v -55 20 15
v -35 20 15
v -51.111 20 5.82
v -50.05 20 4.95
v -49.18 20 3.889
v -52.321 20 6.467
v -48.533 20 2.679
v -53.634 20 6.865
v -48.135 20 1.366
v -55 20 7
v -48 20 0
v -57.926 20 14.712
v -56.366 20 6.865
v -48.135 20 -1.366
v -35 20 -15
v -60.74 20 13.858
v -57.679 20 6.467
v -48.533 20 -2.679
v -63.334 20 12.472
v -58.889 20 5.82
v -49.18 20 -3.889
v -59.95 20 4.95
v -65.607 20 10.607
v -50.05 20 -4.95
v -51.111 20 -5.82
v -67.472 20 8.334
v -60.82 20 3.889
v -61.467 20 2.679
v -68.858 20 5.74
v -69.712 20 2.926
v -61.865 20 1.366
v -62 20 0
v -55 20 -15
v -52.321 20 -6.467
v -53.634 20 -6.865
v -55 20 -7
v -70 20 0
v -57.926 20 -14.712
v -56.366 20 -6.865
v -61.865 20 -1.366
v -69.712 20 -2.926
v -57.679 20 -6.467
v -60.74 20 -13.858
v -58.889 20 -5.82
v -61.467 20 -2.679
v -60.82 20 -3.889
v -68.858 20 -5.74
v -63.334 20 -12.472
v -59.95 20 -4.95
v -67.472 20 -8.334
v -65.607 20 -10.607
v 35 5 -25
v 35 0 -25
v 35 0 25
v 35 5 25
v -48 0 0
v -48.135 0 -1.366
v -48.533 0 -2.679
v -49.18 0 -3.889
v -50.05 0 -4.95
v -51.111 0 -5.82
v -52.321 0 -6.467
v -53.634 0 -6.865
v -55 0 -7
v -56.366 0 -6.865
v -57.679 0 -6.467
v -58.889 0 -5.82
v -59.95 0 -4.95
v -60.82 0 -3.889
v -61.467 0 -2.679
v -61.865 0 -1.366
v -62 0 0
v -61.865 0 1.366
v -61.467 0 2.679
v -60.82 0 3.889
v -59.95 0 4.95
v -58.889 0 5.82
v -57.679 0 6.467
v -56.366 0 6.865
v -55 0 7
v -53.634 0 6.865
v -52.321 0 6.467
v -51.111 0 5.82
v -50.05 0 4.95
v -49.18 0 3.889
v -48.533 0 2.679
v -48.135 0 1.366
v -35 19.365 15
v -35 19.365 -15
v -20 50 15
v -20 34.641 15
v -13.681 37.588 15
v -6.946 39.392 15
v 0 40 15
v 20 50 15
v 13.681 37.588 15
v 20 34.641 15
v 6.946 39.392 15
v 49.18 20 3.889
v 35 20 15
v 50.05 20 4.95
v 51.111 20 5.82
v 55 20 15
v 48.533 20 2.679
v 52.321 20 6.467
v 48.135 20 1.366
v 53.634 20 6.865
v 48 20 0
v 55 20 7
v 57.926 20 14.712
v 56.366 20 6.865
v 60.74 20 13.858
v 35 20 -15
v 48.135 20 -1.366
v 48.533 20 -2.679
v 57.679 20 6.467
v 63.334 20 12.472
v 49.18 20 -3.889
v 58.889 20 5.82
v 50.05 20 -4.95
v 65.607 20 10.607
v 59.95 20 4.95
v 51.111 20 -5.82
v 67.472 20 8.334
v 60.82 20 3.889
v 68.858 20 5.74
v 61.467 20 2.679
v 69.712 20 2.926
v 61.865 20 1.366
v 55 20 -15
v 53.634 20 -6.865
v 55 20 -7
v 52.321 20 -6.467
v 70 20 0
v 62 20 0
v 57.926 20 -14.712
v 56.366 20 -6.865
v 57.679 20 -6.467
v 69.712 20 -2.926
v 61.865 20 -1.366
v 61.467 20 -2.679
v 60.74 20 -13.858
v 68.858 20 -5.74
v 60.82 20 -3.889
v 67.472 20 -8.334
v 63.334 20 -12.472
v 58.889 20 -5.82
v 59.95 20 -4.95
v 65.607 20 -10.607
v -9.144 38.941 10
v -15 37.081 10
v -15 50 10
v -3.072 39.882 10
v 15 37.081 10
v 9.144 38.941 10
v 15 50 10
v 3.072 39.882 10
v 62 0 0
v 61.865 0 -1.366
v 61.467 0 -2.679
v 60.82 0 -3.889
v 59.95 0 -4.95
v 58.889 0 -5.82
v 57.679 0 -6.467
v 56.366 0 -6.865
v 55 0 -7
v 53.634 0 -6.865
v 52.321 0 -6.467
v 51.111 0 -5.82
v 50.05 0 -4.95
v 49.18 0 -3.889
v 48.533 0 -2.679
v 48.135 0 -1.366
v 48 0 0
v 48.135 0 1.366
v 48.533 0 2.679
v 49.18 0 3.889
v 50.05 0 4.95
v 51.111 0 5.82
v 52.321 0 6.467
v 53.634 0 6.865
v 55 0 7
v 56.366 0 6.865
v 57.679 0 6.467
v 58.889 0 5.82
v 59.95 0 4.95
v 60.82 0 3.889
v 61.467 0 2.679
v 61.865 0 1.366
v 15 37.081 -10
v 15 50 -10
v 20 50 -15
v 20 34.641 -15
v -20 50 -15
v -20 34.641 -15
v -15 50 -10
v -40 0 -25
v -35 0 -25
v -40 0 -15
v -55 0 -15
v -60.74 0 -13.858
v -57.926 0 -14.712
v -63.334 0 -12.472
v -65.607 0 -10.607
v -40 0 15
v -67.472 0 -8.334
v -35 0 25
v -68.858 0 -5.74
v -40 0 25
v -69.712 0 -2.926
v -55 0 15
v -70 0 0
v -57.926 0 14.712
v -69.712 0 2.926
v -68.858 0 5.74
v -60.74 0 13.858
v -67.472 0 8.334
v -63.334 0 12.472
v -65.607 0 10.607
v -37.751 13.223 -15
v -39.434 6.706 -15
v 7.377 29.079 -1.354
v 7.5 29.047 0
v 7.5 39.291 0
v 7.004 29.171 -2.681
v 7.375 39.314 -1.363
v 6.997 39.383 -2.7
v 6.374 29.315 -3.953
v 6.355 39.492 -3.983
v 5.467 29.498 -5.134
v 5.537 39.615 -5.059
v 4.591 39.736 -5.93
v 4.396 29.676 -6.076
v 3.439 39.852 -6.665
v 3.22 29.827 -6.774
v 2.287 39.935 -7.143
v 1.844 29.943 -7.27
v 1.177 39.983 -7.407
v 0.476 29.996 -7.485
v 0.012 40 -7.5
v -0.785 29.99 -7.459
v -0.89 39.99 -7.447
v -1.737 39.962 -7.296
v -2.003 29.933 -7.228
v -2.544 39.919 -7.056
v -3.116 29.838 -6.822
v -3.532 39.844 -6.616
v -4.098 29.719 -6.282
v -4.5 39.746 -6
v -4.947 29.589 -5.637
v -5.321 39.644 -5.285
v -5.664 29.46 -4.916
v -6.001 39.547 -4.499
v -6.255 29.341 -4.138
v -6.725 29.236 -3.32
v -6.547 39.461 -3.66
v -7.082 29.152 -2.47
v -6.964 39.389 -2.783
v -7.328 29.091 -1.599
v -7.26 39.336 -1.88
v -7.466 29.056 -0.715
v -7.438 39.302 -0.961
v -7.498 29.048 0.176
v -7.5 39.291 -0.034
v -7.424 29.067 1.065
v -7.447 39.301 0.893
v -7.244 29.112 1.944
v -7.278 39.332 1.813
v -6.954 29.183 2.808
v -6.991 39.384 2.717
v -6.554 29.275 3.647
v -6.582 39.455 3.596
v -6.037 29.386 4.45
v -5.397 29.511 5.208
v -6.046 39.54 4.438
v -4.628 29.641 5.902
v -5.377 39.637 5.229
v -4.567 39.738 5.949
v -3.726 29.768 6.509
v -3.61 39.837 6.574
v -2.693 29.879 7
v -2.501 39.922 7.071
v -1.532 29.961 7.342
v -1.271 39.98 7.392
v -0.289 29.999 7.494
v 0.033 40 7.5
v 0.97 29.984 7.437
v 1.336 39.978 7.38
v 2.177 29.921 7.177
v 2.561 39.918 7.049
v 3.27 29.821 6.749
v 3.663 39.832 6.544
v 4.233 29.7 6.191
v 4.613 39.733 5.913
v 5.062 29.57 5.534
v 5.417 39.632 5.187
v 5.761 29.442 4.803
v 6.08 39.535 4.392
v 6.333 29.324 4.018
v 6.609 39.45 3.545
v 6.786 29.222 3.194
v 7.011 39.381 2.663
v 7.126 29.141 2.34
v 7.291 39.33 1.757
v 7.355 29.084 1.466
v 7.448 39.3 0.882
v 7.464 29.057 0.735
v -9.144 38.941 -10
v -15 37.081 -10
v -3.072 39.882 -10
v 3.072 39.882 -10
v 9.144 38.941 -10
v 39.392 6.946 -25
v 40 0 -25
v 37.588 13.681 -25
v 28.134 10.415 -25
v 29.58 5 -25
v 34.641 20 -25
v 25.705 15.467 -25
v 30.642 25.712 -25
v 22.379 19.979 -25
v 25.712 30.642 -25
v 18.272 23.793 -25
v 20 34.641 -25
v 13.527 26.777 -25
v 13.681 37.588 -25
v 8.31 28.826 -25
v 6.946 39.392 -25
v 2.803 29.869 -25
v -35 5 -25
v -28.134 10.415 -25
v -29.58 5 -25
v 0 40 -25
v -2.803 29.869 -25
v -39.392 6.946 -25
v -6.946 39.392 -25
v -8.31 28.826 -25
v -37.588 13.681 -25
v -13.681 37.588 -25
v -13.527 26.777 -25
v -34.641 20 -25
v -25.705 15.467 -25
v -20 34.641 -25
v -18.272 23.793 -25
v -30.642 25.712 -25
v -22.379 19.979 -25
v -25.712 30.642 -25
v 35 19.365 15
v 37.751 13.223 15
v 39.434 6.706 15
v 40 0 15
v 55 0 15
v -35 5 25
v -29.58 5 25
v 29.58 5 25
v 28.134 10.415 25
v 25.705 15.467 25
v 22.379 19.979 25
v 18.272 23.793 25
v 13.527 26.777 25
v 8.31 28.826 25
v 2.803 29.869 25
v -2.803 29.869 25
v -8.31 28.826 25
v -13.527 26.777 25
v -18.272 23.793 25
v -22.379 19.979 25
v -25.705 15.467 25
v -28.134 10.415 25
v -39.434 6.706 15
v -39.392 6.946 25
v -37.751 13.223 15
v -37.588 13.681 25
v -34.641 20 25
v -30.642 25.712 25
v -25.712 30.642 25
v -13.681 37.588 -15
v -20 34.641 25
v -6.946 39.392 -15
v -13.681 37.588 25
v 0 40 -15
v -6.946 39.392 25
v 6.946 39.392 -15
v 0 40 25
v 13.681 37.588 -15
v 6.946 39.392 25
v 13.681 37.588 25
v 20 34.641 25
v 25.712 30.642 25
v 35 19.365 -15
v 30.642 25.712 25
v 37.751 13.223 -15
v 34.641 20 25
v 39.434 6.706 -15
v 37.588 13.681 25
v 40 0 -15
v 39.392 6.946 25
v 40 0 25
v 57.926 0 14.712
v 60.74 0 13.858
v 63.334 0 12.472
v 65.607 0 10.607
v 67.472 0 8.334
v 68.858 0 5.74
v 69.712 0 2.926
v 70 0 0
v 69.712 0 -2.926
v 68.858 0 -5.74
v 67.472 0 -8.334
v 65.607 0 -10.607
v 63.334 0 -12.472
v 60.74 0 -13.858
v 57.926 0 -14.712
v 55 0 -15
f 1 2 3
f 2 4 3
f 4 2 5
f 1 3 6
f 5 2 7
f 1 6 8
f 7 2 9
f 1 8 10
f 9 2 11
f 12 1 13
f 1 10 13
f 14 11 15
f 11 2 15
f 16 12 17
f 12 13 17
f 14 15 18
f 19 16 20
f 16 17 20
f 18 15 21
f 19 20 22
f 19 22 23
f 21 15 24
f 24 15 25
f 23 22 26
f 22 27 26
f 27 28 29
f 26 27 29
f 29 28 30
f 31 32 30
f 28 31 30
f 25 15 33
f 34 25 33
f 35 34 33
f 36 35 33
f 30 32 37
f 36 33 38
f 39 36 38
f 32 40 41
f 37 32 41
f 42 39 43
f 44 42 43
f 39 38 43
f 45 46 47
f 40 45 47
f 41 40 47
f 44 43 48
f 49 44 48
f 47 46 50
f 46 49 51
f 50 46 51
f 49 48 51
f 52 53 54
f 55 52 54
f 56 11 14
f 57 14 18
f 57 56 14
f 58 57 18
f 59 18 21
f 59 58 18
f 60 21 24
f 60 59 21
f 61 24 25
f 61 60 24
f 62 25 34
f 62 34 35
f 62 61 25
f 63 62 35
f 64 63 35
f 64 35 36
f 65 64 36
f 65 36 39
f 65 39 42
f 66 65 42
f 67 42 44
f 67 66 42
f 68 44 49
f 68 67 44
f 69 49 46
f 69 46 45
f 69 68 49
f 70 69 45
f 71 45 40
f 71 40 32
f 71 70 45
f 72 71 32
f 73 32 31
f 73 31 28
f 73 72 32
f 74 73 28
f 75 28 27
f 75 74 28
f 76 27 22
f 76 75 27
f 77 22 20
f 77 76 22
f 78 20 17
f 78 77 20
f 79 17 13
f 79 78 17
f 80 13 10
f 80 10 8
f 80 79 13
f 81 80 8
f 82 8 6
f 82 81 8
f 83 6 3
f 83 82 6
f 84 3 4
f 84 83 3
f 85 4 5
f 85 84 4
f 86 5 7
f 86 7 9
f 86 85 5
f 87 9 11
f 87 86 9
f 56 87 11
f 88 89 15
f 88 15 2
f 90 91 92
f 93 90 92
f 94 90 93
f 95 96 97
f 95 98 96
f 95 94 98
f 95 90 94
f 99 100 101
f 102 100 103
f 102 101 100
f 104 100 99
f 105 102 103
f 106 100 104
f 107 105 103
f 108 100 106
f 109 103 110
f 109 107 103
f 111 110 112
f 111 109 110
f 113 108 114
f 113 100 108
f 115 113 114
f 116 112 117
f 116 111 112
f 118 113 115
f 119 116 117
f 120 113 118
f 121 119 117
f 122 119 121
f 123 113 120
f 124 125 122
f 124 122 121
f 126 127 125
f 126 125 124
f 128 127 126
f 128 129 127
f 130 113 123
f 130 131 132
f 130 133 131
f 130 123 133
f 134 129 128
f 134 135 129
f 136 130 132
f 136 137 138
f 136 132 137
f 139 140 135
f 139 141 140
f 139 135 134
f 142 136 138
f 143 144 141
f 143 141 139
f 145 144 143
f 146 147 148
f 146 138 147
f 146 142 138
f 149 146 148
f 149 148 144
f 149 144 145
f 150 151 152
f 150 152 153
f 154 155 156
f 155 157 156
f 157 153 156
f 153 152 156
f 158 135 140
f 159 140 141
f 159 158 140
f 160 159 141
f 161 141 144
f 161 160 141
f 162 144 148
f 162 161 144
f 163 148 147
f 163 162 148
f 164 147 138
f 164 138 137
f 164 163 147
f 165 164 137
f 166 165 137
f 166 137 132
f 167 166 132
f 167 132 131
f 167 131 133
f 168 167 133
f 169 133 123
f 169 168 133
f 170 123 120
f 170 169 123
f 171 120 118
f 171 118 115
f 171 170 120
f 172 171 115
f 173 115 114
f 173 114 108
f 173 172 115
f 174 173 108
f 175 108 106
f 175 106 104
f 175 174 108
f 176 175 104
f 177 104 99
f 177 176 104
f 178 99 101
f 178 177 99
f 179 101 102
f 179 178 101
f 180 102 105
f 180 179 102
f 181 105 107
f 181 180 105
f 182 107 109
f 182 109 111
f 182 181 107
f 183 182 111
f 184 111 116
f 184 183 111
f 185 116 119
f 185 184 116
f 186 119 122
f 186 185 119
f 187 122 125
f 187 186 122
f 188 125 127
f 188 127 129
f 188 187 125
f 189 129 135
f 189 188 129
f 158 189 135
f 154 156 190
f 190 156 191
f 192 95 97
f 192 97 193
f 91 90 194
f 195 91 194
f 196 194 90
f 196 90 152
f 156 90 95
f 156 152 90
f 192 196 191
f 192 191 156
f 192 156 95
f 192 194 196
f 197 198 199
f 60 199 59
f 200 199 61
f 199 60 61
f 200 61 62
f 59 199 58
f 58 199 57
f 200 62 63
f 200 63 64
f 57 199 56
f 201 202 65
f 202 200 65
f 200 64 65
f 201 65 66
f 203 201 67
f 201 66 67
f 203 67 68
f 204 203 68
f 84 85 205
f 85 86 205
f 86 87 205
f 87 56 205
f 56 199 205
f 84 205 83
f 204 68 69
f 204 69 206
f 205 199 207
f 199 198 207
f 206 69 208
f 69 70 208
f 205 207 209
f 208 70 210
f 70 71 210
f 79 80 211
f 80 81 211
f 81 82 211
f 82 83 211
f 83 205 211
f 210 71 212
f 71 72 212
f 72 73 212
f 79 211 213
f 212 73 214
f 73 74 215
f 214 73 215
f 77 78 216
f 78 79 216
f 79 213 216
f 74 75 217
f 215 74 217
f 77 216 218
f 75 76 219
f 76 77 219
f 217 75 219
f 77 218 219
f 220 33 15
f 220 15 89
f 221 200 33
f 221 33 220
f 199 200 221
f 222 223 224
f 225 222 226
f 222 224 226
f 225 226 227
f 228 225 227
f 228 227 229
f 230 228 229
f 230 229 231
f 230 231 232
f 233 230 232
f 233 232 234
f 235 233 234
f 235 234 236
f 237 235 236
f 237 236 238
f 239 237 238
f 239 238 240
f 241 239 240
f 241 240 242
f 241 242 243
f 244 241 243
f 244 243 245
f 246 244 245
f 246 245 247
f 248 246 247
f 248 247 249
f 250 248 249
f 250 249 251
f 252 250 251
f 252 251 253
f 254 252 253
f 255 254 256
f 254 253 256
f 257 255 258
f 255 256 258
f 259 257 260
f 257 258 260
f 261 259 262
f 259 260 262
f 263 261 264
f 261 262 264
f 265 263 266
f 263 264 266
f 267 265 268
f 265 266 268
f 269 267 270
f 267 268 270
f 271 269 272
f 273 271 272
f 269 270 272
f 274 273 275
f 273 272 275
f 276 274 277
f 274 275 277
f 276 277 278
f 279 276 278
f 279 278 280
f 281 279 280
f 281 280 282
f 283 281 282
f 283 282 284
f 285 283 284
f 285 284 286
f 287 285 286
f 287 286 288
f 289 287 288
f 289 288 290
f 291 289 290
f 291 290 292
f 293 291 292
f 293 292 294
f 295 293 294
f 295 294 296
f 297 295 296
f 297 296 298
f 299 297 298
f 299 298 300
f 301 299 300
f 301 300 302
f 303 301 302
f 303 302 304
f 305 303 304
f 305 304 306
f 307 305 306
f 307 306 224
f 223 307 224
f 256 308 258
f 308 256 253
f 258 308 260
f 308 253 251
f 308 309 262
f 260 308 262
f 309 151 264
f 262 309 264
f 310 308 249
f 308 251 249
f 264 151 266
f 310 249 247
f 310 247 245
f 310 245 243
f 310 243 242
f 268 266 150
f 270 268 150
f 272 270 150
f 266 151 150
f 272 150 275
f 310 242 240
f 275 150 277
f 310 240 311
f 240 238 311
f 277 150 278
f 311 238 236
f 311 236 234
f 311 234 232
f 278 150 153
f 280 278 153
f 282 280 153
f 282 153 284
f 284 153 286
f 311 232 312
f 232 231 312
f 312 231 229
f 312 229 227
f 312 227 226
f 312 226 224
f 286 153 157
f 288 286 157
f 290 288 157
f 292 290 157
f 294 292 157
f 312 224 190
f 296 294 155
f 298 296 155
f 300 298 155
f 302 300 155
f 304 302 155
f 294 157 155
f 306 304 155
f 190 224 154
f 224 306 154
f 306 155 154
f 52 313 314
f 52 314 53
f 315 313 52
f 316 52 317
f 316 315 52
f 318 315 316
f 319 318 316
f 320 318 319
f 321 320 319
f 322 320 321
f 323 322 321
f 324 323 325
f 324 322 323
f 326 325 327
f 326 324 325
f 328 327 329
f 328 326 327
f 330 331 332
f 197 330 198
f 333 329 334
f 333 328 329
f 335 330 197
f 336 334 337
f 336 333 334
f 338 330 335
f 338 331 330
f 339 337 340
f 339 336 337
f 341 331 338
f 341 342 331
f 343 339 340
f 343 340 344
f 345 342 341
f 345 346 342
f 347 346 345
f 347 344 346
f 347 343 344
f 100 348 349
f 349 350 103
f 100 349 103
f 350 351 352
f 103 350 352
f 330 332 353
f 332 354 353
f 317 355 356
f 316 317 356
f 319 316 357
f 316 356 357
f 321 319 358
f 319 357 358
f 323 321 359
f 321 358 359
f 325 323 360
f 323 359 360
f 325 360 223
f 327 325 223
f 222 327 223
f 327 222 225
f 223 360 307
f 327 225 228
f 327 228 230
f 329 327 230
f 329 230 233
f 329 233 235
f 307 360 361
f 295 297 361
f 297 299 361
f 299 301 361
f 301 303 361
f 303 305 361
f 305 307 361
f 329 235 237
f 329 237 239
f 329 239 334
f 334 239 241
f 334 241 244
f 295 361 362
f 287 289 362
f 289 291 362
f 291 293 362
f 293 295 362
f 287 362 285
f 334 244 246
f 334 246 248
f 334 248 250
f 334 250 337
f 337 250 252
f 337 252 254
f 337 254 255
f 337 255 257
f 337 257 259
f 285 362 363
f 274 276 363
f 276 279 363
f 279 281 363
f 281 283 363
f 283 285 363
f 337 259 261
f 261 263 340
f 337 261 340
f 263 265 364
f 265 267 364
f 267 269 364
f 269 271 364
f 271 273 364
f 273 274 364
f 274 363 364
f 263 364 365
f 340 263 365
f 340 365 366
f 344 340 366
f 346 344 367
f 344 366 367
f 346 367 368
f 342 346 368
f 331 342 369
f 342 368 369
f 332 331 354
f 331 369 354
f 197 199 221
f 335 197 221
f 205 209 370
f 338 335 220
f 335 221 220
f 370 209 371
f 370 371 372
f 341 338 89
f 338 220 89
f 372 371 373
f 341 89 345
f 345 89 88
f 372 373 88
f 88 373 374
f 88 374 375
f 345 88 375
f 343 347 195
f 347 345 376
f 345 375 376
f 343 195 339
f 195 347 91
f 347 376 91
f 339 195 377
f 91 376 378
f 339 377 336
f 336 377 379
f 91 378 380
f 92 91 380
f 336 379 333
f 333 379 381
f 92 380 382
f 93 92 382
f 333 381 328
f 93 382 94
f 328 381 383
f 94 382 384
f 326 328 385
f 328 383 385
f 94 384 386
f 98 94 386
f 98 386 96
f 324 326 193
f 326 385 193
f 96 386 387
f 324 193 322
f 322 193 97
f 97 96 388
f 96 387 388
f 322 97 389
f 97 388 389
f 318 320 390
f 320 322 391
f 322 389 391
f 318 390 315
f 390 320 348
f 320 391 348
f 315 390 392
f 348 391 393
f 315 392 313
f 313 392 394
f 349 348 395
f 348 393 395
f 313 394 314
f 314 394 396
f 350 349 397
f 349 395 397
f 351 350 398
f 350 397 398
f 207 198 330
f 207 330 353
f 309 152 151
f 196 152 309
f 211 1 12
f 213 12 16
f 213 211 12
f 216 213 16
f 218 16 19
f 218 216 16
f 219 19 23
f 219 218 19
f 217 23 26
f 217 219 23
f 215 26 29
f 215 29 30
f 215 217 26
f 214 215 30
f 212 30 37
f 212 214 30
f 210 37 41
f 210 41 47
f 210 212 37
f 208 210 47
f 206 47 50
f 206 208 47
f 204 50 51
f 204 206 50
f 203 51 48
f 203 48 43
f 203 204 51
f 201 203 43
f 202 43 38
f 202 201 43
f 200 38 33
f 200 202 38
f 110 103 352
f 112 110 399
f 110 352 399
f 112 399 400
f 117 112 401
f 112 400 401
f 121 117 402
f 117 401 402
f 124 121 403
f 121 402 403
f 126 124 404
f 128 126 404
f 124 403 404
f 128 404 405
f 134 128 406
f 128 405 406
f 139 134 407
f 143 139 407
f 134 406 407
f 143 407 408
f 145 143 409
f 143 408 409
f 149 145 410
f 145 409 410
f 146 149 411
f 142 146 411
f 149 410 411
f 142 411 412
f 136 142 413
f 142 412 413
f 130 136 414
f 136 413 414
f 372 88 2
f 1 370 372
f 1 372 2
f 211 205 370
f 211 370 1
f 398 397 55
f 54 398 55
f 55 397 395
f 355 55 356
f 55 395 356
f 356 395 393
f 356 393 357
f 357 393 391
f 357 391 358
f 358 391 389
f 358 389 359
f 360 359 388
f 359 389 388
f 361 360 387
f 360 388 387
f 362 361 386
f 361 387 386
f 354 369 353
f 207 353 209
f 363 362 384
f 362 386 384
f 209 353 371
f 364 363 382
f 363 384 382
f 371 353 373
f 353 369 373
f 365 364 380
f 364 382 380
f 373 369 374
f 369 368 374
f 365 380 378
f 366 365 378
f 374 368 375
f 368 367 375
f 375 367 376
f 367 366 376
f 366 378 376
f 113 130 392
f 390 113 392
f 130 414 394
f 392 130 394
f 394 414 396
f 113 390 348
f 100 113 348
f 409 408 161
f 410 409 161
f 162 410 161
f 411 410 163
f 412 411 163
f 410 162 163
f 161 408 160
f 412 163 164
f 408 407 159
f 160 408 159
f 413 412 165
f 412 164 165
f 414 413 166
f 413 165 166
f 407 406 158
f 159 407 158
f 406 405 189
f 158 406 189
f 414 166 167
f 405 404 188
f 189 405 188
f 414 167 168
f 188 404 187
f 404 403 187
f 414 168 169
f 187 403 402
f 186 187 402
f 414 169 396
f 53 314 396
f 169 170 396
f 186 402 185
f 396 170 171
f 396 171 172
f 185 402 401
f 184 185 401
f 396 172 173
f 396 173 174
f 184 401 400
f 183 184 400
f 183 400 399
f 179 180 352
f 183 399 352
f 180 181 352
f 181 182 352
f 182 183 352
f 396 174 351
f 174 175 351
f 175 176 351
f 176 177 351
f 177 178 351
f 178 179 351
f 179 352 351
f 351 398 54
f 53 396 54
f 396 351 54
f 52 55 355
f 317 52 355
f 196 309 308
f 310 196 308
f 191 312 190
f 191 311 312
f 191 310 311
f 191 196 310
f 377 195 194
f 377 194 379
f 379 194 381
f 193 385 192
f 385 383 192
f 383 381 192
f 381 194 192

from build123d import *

# Parameters (mm, degrees)
SKETCH2_R                = 7
BOSS_EXTRUDE1_DEPTH      = 20
BOSS_EXTRUDE1_2_DEPTH    = 20
BOSS_EXTRUDE4_DEPTH      = 25
BOSS_EXTRUDE4_DEPTH_BACK = 25
BOSS_EXTRUDE5_REACH      = 52
SKETCH5_W                = 40
SKETCH5_H                = 30
SKETCH5_W_2              = 30
SKETCH5_H_2              = 20
SKETCH6_R                = 7.5
CUT_EXTRUDE1_DEPTH       = 51


with BuildPart() as part:
    # Sketch2 → Boss-Extrude1 (new body)
    with BuildSketch(Plane(origin=(0, 0, 0), x_dir=(1, 0, 0), z_dir=(0, 1, 0))):
        with BuildLine():
            Line((-55, 15), (-35, 15))
            Line((-35, 15), (-35, -15))
            Line((-35, -15), (-55, -15))
            ThreePointArc((-55, -15), (-70, 0), (-55, 15))
        make_face()
        with Locations((-55, 0)):
            Circle(SKETCH2_R, mode=Mode.SUBTRACT)
    extrude(amount=BOSS_EXTRUDE1_DEPTH)



with BuildPart() as body_2:
    # Sketch2 → Boss-Extrude1 2 (new body)
    with BuildSketch(Plane(origin=(0, 0, 0), x_dir=(1, 0, 0), z_dir=(0, 1, 0))):
        with BuildLine():
            Line((35, -15), (55, -15))
            ThreePointArc((55, -15), (70, 0), (55, 15))
            Line((55, 15), (35, 15))
            Line((35, 15), (35, -15))
        make_face()
        with Locations((55, 0)):
            Circle(SKETCH2_R, mode=Mode.SUBTRACT)
    extrude(amount=BOSS_EXTRUDE1_2_DEPTH)


with BuildPart() as part_1:
    add(part.part)

    add(body_2.part)  # Boss-Extrude4 merges body 2
    # Sketch3 → Boss-Extrude4 (add, two sides)
    with BuildSketch(Plane.XY) as boss_extrude4_sk:
        with BuildLine():
            ThreePointArc((29.580398915, 5), (0, 30), (-29.580398915, 5))
            Line((-29.580398915, 5), (-35, 5))
            Line((-35, 5), (-35, 0))
            Line((-35, 0), (-40, 0))
            ThreePointArc((-40, 0), (0, 40), (40, 0))
            Line((40, 0), (35, 0))
            Line((35, 0), (35, 5))
            Line((35, 5), (29.580398915, 5))
        make_face()
    extrude(amount=BOSS_EXTRUDE4_DEPTH)
    extrude(boss_extrude4_sk.sketch, amount=-BOSS_EXTRUDE4_DEPTH_BACK)

    # Sketch5 → Boss-Extrude5 (add, up to next)
    with BuildSketch(Plane(origin=(0, 50, 0), x_dir=(1, 0, 0), z_dir=(0, 1, 0)), mode=Mode.PRIVATE) as boss_extrude5_sk1:
        Rectangle(SKETCH5_W, SKETCH5_H)
        Rectangle(SKETCH5_W_2, SKETCH5_H_2, mode=Mode.SUBTRACT)
    boss_extrude5_tool1 = extrude(boss_extrude5_sk1.sketch, amount=-BOSS_EXTRUDE5_REACH, mode=Mode.PRIVATE) - part_1.part
    add(boss_extrude5_tool1.solids().sort_by_distance((0, 50, 14.5))[0])

    # Sketch6 → Cut-Extrude1 (cut, through all)
    with BuildSketch(Plane(origin=(0, 50, 0), x_dir=(1, 0, 0), z_dir=(0, 1, 0))):
        Circle(SKETCH6_R)
    extrude(amount=-CUT_EXTRUDE1_DEPTH, mode=Mode.SUBTRACT)


solid = part_1.part
